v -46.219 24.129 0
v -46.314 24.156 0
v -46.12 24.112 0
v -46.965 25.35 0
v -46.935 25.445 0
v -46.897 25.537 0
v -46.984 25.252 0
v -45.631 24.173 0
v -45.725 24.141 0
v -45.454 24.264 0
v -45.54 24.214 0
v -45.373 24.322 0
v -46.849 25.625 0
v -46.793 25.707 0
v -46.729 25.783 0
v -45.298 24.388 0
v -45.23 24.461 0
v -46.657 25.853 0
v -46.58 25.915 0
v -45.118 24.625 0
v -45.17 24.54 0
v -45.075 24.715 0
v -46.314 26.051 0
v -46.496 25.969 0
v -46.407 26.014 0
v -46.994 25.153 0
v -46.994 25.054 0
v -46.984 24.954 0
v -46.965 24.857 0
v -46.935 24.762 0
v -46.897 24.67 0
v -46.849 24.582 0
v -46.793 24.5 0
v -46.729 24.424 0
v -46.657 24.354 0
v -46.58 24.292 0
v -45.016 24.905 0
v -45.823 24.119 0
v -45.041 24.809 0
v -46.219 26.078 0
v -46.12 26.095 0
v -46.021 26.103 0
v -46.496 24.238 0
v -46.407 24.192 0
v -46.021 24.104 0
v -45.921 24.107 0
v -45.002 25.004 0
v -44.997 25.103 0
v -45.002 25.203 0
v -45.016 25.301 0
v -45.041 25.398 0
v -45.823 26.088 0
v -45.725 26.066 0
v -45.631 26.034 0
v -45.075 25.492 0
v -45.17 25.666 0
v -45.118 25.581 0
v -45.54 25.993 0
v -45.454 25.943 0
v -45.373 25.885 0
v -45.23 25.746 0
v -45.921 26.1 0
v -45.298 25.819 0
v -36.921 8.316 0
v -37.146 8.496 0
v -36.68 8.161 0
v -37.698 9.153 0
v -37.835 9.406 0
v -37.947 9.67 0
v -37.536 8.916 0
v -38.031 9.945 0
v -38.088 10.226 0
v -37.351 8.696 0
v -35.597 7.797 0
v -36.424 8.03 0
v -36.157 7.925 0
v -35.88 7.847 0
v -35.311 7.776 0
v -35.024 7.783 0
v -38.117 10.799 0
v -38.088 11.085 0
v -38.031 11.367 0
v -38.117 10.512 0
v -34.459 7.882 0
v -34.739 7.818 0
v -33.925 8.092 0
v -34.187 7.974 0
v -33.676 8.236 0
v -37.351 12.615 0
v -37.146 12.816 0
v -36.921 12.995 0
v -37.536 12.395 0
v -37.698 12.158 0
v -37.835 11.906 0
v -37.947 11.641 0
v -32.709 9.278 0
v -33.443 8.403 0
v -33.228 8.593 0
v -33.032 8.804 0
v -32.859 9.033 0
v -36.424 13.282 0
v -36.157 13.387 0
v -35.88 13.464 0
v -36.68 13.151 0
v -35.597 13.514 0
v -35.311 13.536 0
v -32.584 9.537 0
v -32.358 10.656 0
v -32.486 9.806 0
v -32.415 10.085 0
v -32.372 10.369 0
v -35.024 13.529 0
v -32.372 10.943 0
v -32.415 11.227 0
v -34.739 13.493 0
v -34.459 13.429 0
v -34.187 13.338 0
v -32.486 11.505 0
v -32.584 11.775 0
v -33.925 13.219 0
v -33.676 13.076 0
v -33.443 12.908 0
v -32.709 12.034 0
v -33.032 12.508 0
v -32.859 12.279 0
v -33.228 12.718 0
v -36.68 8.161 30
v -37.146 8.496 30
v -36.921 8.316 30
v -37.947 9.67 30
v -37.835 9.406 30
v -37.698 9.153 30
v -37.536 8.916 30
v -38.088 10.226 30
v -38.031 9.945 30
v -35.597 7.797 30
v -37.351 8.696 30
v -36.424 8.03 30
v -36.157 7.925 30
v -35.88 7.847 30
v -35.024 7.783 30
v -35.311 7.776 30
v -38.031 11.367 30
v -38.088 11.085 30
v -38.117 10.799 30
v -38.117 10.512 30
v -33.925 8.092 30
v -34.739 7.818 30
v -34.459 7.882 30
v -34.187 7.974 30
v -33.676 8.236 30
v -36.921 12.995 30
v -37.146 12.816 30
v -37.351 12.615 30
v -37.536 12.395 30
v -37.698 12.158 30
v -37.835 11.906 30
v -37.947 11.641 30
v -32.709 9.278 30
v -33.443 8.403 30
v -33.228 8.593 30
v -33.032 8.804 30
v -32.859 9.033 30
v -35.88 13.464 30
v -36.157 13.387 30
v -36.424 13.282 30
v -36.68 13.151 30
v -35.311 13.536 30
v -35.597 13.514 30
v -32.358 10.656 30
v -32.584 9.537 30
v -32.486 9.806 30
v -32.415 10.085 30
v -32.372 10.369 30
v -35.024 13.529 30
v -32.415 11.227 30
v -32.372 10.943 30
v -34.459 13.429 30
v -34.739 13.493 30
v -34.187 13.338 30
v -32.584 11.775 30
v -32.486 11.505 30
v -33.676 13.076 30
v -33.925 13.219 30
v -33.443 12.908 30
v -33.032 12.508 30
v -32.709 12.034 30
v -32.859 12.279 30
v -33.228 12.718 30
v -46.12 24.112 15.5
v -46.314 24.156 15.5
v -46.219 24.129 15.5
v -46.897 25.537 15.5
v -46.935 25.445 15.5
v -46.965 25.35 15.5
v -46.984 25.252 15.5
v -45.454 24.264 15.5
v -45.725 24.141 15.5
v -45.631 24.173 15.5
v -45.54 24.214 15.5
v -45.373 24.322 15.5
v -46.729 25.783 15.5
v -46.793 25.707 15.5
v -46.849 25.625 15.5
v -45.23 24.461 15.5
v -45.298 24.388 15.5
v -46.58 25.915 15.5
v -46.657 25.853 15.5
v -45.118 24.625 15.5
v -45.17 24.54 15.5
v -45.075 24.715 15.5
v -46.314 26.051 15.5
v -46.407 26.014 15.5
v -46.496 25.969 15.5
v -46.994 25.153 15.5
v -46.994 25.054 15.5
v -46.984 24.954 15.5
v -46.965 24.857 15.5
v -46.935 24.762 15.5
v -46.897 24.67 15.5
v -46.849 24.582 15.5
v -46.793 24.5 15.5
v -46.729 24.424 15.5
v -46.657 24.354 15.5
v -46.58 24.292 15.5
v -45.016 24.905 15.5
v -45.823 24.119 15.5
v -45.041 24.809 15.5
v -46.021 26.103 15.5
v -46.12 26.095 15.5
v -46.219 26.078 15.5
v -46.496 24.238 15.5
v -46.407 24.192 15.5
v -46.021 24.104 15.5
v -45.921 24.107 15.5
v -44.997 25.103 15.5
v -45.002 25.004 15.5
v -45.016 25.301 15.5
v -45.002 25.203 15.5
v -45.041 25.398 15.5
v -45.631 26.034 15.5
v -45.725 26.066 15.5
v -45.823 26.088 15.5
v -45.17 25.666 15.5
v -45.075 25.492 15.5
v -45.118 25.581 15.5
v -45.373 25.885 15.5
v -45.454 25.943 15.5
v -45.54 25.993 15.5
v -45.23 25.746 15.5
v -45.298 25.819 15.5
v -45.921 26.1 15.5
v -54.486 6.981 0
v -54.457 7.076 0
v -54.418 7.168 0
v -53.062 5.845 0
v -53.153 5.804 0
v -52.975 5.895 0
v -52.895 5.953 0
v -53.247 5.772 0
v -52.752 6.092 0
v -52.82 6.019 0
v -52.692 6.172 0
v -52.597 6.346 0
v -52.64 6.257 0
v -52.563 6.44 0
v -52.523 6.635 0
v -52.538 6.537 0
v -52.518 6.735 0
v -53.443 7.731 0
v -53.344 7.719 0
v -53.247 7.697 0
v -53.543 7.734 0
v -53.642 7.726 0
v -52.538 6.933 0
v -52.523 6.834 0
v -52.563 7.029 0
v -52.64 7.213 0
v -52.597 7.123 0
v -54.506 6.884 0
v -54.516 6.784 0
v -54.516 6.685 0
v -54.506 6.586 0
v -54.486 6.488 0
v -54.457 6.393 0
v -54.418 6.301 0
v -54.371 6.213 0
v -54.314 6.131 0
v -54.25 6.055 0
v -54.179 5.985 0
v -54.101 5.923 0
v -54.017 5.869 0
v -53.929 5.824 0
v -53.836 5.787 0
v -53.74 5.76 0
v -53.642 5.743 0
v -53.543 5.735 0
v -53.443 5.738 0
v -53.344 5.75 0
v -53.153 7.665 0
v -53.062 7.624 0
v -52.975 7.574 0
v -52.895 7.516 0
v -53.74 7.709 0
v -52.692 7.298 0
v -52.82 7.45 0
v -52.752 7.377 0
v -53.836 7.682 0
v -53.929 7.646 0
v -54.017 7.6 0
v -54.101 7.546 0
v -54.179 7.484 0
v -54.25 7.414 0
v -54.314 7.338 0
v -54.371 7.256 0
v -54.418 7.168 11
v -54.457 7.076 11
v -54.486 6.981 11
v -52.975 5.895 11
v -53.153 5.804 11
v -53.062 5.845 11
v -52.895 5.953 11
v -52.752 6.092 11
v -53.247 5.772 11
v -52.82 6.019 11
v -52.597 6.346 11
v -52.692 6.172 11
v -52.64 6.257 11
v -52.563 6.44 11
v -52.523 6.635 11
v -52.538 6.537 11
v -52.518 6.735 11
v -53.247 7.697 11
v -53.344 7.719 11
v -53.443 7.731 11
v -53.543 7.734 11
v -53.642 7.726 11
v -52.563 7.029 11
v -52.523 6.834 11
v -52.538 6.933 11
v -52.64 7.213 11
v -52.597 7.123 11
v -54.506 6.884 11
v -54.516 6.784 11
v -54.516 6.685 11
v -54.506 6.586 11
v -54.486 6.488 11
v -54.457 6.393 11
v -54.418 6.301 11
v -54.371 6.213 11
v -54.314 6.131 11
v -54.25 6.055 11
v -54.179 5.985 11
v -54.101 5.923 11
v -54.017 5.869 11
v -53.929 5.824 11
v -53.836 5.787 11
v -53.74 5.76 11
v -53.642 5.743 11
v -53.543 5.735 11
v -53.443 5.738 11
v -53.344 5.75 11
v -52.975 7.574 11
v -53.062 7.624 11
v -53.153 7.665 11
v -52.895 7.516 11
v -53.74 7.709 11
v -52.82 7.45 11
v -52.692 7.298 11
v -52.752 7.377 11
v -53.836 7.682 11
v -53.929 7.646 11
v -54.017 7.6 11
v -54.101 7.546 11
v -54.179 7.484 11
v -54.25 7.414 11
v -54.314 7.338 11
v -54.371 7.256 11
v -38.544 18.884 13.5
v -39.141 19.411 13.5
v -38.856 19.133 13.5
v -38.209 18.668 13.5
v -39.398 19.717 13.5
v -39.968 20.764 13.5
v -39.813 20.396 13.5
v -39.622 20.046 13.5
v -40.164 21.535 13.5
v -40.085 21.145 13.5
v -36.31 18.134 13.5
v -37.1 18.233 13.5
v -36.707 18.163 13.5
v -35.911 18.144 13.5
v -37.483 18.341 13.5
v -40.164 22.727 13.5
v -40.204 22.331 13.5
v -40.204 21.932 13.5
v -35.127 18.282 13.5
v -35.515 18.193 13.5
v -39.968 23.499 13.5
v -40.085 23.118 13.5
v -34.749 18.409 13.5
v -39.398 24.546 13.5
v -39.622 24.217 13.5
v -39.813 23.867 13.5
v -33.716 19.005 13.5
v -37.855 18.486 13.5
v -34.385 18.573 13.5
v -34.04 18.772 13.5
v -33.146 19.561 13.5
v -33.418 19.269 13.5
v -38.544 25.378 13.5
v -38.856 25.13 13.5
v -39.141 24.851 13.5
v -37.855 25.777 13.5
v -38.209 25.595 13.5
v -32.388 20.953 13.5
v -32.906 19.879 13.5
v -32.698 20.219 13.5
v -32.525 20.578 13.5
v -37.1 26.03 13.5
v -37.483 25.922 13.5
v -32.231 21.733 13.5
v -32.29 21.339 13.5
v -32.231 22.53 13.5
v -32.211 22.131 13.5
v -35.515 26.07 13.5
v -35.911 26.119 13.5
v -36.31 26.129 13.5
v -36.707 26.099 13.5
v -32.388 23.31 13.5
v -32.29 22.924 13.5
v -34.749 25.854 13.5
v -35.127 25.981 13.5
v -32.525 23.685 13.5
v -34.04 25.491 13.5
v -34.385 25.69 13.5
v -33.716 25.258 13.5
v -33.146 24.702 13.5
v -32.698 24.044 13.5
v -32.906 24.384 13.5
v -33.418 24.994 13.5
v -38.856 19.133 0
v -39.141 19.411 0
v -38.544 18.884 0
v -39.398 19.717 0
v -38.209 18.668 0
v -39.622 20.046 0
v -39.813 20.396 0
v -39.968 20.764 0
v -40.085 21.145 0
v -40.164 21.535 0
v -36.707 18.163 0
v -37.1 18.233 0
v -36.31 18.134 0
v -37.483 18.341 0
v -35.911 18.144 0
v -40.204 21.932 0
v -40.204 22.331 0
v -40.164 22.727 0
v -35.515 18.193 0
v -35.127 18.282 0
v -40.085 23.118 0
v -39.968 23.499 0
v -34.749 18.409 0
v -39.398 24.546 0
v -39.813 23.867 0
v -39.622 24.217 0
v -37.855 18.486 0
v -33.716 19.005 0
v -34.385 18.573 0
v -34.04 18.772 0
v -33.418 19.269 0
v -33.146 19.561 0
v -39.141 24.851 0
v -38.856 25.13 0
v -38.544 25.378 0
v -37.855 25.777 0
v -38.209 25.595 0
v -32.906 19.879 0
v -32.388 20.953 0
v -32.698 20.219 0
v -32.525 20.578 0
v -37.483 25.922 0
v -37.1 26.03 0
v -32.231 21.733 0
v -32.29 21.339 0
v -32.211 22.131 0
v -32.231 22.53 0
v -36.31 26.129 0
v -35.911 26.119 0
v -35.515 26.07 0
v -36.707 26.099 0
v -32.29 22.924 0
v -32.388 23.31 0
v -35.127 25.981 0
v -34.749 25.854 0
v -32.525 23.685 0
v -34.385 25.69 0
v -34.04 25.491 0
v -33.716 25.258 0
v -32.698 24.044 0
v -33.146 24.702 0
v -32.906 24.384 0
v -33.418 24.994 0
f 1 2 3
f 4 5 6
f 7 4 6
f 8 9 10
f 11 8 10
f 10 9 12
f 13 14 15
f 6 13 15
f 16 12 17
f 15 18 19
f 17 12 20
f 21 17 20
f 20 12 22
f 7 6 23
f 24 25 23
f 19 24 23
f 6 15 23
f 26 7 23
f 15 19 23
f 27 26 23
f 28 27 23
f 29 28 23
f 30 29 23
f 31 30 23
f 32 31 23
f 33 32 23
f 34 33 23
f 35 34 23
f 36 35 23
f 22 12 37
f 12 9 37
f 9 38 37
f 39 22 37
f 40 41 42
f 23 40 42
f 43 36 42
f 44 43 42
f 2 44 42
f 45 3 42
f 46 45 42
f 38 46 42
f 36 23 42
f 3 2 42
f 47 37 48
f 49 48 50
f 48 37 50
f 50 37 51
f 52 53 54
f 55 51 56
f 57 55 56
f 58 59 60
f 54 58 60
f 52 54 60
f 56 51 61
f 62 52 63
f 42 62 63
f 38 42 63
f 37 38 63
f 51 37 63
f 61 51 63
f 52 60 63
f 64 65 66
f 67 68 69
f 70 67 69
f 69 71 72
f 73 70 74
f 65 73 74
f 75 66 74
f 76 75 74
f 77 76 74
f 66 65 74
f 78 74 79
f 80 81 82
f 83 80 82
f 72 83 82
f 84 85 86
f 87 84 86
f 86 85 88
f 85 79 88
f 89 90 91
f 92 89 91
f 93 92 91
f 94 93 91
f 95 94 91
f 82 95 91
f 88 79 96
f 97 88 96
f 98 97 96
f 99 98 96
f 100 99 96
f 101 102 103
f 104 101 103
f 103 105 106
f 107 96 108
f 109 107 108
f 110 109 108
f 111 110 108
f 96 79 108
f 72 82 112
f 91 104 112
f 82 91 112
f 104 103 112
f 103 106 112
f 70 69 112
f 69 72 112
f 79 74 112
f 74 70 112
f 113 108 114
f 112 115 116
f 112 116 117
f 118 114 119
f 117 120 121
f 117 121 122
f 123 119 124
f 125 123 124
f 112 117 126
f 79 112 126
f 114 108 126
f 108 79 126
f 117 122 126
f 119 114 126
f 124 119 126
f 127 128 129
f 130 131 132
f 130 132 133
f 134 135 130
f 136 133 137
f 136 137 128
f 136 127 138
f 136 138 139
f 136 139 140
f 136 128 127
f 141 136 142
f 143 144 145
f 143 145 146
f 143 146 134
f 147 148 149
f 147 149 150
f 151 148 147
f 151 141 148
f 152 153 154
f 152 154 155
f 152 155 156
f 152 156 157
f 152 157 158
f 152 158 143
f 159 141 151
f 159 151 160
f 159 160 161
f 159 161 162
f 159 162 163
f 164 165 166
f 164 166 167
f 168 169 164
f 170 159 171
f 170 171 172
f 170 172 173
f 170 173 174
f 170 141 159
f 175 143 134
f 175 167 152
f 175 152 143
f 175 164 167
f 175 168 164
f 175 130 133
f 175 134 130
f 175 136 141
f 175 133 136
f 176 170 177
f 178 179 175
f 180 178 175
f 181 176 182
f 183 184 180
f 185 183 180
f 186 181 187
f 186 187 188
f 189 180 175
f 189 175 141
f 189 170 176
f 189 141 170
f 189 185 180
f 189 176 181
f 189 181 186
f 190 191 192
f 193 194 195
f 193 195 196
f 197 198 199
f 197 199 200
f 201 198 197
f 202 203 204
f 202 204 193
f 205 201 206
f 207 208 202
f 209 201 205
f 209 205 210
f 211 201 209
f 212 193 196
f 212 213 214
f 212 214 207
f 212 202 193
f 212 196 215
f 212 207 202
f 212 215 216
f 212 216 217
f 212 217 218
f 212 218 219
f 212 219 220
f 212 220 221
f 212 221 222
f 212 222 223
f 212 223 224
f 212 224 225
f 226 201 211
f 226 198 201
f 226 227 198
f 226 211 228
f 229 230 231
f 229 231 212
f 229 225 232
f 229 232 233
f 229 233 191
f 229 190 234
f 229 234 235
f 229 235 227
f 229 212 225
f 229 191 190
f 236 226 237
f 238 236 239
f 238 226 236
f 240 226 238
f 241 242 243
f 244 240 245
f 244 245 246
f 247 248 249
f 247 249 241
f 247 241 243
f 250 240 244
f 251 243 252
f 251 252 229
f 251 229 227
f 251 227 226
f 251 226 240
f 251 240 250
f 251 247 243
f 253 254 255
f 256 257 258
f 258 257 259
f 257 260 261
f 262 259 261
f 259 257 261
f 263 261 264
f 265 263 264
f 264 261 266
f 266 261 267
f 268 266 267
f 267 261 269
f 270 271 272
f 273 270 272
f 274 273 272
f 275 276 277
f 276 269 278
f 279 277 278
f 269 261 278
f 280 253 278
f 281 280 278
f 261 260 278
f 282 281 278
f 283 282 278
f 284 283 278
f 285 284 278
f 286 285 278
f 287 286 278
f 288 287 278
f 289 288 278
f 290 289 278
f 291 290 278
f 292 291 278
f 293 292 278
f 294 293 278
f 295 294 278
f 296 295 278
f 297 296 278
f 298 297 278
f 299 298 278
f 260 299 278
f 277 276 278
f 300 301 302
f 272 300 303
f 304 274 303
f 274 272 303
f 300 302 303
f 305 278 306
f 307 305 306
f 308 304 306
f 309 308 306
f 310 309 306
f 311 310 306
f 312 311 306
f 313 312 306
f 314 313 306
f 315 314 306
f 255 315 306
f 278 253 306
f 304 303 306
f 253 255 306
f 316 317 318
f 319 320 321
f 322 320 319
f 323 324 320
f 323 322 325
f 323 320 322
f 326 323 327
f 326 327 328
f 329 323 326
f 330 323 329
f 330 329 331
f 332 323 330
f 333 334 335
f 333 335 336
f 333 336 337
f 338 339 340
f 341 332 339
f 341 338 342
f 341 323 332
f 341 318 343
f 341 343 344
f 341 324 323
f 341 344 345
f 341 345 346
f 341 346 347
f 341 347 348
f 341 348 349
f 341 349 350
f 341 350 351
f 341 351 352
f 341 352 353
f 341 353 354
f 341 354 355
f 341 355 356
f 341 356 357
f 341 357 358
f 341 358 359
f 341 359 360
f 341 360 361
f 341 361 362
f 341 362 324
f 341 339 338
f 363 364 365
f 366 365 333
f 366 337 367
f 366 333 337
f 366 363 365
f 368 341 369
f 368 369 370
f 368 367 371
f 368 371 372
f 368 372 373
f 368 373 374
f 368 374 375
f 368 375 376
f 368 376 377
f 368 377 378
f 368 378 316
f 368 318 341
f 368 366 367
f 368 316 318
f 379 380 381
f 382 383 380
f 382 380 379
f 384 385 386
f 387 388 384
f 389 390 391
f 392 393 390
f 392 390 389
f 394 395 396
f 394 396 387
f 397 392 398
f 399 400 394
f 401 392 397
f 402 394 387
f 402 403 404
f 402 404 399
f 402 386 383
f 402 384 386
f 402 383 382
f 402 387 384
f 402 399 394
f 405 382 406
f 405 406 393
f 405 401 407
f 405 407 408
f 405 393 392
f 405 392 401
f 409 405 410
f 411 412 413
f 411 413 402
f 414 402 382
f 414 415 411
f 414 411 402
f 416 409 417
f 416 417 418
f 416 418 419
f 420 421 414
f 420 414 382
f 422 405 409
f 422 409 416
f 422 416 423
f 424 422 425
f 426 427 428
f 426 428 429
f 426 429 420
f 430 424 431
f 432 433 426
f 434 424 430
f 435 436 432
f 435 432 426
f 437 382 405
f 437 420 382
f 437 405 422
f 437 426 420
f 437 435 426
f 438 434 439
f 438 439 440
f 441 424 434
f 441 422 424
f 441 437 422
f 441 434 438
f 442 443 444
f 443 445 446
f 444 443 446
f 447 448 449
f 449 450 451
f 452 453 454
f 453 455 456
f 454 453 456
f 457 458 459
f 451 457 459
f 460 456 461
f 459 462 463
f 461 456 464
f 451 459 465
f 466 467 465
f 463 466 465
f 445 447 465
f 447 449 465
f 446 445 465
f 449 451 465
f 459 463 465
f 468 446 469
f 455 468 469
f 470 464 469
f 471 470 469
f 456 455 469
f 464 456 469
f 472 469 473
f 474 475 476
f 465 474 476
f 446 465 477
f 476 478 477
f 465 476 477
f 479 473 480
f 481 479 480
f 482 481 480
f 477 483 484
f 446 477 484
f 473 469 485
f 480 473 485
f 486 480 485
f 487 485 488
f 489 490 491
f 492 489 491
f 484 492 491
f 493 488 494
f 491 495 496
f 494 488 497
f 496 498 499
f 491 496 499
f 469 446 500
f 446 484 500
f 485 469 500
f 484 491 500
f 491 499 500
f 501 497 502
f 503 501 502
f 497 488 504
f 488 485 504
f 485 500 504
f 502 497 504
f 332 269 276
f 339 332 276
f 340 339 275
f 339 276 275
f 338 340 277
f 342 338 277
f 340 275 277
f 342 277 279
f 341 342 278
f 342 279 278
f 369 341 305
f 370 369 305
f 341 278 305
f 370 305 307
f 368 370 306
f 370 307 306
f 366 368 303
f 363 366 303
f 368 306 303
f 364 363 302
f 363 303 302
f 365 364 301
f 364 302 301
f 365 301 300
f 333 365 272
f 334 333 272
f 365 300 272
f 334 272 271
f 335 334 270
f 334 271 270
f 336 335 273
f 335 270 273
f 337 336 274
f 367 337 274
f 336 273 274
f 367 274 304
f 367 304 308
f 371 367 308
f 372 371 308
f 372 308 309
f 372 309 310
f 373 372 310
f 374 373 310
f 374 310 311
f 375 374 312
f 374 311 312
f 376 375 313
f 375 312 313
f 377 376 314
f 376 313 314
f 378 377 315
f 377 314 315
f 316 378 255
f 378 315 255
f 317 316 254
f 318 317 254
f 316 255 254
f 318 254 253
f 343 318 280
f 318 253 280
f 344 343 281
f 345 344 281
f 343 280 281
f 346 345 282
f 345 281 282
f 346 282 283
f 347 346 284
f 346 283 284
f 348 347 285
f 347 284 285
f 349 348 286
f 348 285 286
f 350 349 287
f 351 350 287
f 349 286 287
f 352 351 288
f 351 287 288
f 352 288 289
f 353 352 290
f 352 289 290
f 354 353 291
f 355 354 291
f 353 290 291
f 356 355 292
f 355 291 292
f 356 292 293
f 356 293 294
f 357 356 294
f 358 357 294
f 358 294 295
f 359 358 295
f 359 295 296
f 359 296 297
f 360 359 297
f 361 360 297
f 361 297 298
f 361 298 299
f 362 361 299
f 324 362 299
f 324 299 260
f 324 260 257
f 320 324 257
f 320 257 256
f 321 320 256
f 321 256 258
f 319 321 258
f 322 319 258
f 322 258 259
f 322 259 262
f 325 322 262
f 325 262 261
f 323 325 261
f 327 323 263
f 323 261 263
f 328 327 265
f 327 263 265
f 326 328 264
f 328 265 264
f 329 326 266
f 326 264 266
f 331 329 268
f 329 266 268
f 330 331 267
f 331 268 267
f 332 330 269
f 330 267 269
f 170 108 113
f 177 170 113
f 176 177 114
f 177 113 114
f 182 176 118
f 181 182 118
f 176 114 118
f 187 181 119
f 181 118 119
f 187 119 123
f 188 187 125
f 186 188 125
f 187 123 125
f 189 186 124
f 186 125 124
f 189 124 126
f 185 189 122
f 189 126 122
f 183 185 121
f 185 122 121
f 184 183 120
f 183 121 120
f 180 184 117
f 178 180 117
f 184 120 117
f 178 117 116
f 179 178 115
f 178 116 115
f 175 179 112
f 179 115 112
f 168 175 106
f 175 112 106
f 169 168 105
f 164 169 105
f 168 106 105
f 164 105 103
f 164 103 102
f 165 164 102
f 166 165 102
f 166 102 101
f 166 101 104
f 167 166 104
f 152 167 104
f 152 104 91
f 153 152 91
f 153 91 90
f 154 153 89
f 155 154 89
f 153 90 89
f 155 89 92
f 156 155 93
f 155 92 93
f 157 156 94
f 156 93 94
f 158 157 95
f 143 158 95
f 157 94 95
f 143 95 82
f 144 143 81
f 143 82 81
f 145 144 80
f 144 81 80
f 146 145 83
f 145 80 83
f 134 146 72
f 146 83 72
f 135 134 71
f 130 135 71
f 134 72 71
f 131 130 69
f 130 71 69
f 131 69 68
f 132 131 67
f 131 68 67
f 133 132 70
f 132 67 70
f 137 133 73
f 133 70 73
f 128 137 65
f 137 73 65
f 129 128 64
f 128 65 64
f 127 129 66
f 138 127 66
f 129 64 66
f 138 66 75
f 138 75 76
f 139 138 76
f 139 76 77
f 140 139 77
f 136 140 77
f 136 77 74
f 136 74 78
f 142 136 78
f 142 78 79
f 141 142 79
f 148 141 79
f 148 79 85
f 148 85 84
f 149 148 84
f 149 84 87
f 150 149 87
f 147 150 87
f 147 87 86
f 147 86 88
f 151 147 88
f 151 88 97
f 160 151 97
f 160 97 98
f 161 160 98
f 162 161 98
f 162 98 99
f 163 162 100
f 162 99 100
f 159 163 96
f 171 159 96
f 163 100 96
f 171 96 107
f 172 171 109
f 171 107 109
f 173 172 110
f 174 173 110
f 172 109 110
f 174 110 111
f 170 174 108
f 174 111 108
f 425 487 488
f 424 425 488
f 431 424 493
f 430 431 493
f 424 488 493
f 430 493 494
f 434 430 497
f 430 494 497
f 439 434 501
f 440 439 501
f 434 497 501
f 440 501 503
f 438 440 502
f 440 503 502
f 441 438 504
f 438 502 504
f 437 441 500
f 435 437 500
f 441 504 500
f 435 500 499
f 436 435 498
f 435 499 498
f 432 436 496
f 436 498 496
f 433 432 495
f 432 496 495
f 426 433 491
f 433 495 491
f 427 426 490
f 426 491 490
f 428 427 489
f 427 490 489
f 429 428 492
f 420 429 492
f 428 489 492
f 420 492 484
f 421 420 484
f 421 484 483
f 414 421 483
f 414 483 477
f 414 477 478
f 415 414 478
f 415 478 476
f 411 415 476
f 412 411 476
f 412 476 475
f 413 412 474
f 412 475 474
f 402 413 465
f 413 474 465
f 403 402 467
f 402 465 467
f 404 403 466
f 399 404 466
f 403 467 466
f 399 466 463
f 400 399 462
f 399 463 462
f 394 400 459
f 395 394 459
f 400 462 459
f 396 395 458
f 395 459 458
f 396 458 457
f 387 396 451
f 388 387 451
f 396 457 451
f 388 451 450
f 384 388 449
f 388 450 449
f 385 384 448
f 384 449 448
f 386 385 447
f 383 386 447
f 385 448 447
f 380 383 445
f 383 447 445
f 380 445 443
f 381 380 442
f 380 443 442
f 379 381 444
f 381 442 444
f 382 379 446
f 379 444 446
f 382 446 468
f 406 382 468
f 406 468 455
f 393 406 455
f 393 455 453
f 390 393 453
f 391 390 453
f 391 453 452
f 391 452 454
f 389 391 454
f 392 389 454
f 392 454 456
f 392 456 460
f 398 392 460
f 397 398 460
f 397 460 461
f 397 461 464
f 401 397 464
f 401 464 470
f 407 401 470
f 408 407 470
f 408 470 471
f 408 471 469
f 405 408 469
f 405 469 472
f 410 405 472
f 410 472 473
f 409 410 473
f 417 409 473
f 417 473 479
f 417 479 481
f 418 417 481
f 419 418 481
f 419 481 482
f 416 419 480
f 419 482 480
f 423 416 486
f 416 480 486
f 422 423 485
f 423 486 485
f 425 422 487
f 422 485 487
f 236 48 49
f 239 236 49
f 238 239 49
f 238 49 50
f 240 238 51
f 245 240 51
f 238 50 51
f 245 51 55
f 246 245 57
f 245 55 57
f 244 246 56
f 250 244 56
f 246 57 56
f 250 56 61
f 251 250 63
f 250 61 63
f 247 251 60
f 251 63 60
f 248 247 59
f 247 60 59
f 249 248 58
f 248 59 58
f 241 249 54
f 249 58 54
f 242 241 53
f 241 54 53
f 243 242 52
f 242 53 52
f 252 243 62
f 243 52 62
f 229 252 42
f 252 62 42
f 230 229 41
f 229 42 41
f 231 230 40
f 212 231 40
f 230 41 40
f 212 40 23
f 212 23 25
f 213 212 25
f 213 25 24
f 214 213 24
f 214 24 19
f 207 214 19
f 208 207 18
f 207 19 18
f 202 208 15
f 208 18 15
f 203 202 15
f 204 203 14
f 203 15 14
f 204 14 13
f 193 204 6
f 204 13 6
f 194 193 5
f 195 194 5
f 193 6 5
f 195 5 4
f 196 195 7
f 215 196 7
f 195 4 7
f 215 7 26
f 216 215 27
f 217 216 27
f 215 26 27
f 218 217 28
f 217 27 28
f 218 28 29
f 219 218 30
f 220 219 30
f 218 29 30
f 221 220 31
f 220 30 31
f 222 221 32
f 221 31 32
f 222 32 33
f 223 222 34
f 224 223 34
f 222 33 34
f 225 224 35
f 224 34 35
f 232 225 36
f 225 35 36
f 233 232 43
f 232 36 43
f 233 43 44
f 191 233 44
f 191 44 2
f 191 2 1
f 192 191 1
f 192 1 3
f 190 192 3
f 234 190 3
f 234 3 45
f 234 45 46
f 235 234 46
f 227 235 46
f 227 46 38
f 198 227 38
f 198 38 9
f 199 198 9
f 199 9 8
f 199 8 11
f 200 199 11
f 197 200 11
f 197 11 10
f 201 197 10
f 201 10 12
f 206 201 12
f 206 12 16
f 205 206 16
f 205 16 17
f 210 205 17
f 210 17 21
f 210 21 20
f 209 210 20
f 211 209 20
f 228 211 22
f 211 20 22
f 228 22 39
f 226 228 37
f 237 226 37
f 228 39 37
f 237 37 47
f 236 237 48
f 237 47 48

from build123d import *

# Parameters (mm, degrees)
F0_R     = 3.998993
F1_DEPTH = 13.5
F0_R_2   = 0.999494
F2_DEPTH = 15.5
F3_DEPTH = 11
F0_R_3   = 2.881039
F4_DEPTH = 30


with BuildPart() as f1:
    # F0 (on Top) → F1 (new body)
    with BuildSketch(Plane.XY):
        with Locations((-36.209825, 22.131426)):
            Circle(F0_R)
    extrude(amount=F1_DEPTH)


with BuildPart() as f2:
    # F0 (on Top) → F2 (new body)
    with BuildSketch(Plane.XY):
        with Locations((-45.996096, 25.103435)):
            Circle(F0_R_2)
    extrude(amount=F2_DEPTH)


with BuildPart() as f3:
    # F0 (on Top) → F3 (new body)
    with BuildSketch(Plane.XY):
        with Locations((-53.517677, 6.734607)):
            Circle(F0_R_2)
    extrude(amount=F3_DEPTH)


with BuildPart() as f4:
    # F0 (on Top) → F4 (new body)
    with BuildSketch(Plane.XY):
        with Locations((-35.23922, 10.655653)):
            Circle(F0_R_3)
    extrude(amount=F4_DEPTH)


solid = Compound([f1.part, f2.part, f3.part, f4.part])
